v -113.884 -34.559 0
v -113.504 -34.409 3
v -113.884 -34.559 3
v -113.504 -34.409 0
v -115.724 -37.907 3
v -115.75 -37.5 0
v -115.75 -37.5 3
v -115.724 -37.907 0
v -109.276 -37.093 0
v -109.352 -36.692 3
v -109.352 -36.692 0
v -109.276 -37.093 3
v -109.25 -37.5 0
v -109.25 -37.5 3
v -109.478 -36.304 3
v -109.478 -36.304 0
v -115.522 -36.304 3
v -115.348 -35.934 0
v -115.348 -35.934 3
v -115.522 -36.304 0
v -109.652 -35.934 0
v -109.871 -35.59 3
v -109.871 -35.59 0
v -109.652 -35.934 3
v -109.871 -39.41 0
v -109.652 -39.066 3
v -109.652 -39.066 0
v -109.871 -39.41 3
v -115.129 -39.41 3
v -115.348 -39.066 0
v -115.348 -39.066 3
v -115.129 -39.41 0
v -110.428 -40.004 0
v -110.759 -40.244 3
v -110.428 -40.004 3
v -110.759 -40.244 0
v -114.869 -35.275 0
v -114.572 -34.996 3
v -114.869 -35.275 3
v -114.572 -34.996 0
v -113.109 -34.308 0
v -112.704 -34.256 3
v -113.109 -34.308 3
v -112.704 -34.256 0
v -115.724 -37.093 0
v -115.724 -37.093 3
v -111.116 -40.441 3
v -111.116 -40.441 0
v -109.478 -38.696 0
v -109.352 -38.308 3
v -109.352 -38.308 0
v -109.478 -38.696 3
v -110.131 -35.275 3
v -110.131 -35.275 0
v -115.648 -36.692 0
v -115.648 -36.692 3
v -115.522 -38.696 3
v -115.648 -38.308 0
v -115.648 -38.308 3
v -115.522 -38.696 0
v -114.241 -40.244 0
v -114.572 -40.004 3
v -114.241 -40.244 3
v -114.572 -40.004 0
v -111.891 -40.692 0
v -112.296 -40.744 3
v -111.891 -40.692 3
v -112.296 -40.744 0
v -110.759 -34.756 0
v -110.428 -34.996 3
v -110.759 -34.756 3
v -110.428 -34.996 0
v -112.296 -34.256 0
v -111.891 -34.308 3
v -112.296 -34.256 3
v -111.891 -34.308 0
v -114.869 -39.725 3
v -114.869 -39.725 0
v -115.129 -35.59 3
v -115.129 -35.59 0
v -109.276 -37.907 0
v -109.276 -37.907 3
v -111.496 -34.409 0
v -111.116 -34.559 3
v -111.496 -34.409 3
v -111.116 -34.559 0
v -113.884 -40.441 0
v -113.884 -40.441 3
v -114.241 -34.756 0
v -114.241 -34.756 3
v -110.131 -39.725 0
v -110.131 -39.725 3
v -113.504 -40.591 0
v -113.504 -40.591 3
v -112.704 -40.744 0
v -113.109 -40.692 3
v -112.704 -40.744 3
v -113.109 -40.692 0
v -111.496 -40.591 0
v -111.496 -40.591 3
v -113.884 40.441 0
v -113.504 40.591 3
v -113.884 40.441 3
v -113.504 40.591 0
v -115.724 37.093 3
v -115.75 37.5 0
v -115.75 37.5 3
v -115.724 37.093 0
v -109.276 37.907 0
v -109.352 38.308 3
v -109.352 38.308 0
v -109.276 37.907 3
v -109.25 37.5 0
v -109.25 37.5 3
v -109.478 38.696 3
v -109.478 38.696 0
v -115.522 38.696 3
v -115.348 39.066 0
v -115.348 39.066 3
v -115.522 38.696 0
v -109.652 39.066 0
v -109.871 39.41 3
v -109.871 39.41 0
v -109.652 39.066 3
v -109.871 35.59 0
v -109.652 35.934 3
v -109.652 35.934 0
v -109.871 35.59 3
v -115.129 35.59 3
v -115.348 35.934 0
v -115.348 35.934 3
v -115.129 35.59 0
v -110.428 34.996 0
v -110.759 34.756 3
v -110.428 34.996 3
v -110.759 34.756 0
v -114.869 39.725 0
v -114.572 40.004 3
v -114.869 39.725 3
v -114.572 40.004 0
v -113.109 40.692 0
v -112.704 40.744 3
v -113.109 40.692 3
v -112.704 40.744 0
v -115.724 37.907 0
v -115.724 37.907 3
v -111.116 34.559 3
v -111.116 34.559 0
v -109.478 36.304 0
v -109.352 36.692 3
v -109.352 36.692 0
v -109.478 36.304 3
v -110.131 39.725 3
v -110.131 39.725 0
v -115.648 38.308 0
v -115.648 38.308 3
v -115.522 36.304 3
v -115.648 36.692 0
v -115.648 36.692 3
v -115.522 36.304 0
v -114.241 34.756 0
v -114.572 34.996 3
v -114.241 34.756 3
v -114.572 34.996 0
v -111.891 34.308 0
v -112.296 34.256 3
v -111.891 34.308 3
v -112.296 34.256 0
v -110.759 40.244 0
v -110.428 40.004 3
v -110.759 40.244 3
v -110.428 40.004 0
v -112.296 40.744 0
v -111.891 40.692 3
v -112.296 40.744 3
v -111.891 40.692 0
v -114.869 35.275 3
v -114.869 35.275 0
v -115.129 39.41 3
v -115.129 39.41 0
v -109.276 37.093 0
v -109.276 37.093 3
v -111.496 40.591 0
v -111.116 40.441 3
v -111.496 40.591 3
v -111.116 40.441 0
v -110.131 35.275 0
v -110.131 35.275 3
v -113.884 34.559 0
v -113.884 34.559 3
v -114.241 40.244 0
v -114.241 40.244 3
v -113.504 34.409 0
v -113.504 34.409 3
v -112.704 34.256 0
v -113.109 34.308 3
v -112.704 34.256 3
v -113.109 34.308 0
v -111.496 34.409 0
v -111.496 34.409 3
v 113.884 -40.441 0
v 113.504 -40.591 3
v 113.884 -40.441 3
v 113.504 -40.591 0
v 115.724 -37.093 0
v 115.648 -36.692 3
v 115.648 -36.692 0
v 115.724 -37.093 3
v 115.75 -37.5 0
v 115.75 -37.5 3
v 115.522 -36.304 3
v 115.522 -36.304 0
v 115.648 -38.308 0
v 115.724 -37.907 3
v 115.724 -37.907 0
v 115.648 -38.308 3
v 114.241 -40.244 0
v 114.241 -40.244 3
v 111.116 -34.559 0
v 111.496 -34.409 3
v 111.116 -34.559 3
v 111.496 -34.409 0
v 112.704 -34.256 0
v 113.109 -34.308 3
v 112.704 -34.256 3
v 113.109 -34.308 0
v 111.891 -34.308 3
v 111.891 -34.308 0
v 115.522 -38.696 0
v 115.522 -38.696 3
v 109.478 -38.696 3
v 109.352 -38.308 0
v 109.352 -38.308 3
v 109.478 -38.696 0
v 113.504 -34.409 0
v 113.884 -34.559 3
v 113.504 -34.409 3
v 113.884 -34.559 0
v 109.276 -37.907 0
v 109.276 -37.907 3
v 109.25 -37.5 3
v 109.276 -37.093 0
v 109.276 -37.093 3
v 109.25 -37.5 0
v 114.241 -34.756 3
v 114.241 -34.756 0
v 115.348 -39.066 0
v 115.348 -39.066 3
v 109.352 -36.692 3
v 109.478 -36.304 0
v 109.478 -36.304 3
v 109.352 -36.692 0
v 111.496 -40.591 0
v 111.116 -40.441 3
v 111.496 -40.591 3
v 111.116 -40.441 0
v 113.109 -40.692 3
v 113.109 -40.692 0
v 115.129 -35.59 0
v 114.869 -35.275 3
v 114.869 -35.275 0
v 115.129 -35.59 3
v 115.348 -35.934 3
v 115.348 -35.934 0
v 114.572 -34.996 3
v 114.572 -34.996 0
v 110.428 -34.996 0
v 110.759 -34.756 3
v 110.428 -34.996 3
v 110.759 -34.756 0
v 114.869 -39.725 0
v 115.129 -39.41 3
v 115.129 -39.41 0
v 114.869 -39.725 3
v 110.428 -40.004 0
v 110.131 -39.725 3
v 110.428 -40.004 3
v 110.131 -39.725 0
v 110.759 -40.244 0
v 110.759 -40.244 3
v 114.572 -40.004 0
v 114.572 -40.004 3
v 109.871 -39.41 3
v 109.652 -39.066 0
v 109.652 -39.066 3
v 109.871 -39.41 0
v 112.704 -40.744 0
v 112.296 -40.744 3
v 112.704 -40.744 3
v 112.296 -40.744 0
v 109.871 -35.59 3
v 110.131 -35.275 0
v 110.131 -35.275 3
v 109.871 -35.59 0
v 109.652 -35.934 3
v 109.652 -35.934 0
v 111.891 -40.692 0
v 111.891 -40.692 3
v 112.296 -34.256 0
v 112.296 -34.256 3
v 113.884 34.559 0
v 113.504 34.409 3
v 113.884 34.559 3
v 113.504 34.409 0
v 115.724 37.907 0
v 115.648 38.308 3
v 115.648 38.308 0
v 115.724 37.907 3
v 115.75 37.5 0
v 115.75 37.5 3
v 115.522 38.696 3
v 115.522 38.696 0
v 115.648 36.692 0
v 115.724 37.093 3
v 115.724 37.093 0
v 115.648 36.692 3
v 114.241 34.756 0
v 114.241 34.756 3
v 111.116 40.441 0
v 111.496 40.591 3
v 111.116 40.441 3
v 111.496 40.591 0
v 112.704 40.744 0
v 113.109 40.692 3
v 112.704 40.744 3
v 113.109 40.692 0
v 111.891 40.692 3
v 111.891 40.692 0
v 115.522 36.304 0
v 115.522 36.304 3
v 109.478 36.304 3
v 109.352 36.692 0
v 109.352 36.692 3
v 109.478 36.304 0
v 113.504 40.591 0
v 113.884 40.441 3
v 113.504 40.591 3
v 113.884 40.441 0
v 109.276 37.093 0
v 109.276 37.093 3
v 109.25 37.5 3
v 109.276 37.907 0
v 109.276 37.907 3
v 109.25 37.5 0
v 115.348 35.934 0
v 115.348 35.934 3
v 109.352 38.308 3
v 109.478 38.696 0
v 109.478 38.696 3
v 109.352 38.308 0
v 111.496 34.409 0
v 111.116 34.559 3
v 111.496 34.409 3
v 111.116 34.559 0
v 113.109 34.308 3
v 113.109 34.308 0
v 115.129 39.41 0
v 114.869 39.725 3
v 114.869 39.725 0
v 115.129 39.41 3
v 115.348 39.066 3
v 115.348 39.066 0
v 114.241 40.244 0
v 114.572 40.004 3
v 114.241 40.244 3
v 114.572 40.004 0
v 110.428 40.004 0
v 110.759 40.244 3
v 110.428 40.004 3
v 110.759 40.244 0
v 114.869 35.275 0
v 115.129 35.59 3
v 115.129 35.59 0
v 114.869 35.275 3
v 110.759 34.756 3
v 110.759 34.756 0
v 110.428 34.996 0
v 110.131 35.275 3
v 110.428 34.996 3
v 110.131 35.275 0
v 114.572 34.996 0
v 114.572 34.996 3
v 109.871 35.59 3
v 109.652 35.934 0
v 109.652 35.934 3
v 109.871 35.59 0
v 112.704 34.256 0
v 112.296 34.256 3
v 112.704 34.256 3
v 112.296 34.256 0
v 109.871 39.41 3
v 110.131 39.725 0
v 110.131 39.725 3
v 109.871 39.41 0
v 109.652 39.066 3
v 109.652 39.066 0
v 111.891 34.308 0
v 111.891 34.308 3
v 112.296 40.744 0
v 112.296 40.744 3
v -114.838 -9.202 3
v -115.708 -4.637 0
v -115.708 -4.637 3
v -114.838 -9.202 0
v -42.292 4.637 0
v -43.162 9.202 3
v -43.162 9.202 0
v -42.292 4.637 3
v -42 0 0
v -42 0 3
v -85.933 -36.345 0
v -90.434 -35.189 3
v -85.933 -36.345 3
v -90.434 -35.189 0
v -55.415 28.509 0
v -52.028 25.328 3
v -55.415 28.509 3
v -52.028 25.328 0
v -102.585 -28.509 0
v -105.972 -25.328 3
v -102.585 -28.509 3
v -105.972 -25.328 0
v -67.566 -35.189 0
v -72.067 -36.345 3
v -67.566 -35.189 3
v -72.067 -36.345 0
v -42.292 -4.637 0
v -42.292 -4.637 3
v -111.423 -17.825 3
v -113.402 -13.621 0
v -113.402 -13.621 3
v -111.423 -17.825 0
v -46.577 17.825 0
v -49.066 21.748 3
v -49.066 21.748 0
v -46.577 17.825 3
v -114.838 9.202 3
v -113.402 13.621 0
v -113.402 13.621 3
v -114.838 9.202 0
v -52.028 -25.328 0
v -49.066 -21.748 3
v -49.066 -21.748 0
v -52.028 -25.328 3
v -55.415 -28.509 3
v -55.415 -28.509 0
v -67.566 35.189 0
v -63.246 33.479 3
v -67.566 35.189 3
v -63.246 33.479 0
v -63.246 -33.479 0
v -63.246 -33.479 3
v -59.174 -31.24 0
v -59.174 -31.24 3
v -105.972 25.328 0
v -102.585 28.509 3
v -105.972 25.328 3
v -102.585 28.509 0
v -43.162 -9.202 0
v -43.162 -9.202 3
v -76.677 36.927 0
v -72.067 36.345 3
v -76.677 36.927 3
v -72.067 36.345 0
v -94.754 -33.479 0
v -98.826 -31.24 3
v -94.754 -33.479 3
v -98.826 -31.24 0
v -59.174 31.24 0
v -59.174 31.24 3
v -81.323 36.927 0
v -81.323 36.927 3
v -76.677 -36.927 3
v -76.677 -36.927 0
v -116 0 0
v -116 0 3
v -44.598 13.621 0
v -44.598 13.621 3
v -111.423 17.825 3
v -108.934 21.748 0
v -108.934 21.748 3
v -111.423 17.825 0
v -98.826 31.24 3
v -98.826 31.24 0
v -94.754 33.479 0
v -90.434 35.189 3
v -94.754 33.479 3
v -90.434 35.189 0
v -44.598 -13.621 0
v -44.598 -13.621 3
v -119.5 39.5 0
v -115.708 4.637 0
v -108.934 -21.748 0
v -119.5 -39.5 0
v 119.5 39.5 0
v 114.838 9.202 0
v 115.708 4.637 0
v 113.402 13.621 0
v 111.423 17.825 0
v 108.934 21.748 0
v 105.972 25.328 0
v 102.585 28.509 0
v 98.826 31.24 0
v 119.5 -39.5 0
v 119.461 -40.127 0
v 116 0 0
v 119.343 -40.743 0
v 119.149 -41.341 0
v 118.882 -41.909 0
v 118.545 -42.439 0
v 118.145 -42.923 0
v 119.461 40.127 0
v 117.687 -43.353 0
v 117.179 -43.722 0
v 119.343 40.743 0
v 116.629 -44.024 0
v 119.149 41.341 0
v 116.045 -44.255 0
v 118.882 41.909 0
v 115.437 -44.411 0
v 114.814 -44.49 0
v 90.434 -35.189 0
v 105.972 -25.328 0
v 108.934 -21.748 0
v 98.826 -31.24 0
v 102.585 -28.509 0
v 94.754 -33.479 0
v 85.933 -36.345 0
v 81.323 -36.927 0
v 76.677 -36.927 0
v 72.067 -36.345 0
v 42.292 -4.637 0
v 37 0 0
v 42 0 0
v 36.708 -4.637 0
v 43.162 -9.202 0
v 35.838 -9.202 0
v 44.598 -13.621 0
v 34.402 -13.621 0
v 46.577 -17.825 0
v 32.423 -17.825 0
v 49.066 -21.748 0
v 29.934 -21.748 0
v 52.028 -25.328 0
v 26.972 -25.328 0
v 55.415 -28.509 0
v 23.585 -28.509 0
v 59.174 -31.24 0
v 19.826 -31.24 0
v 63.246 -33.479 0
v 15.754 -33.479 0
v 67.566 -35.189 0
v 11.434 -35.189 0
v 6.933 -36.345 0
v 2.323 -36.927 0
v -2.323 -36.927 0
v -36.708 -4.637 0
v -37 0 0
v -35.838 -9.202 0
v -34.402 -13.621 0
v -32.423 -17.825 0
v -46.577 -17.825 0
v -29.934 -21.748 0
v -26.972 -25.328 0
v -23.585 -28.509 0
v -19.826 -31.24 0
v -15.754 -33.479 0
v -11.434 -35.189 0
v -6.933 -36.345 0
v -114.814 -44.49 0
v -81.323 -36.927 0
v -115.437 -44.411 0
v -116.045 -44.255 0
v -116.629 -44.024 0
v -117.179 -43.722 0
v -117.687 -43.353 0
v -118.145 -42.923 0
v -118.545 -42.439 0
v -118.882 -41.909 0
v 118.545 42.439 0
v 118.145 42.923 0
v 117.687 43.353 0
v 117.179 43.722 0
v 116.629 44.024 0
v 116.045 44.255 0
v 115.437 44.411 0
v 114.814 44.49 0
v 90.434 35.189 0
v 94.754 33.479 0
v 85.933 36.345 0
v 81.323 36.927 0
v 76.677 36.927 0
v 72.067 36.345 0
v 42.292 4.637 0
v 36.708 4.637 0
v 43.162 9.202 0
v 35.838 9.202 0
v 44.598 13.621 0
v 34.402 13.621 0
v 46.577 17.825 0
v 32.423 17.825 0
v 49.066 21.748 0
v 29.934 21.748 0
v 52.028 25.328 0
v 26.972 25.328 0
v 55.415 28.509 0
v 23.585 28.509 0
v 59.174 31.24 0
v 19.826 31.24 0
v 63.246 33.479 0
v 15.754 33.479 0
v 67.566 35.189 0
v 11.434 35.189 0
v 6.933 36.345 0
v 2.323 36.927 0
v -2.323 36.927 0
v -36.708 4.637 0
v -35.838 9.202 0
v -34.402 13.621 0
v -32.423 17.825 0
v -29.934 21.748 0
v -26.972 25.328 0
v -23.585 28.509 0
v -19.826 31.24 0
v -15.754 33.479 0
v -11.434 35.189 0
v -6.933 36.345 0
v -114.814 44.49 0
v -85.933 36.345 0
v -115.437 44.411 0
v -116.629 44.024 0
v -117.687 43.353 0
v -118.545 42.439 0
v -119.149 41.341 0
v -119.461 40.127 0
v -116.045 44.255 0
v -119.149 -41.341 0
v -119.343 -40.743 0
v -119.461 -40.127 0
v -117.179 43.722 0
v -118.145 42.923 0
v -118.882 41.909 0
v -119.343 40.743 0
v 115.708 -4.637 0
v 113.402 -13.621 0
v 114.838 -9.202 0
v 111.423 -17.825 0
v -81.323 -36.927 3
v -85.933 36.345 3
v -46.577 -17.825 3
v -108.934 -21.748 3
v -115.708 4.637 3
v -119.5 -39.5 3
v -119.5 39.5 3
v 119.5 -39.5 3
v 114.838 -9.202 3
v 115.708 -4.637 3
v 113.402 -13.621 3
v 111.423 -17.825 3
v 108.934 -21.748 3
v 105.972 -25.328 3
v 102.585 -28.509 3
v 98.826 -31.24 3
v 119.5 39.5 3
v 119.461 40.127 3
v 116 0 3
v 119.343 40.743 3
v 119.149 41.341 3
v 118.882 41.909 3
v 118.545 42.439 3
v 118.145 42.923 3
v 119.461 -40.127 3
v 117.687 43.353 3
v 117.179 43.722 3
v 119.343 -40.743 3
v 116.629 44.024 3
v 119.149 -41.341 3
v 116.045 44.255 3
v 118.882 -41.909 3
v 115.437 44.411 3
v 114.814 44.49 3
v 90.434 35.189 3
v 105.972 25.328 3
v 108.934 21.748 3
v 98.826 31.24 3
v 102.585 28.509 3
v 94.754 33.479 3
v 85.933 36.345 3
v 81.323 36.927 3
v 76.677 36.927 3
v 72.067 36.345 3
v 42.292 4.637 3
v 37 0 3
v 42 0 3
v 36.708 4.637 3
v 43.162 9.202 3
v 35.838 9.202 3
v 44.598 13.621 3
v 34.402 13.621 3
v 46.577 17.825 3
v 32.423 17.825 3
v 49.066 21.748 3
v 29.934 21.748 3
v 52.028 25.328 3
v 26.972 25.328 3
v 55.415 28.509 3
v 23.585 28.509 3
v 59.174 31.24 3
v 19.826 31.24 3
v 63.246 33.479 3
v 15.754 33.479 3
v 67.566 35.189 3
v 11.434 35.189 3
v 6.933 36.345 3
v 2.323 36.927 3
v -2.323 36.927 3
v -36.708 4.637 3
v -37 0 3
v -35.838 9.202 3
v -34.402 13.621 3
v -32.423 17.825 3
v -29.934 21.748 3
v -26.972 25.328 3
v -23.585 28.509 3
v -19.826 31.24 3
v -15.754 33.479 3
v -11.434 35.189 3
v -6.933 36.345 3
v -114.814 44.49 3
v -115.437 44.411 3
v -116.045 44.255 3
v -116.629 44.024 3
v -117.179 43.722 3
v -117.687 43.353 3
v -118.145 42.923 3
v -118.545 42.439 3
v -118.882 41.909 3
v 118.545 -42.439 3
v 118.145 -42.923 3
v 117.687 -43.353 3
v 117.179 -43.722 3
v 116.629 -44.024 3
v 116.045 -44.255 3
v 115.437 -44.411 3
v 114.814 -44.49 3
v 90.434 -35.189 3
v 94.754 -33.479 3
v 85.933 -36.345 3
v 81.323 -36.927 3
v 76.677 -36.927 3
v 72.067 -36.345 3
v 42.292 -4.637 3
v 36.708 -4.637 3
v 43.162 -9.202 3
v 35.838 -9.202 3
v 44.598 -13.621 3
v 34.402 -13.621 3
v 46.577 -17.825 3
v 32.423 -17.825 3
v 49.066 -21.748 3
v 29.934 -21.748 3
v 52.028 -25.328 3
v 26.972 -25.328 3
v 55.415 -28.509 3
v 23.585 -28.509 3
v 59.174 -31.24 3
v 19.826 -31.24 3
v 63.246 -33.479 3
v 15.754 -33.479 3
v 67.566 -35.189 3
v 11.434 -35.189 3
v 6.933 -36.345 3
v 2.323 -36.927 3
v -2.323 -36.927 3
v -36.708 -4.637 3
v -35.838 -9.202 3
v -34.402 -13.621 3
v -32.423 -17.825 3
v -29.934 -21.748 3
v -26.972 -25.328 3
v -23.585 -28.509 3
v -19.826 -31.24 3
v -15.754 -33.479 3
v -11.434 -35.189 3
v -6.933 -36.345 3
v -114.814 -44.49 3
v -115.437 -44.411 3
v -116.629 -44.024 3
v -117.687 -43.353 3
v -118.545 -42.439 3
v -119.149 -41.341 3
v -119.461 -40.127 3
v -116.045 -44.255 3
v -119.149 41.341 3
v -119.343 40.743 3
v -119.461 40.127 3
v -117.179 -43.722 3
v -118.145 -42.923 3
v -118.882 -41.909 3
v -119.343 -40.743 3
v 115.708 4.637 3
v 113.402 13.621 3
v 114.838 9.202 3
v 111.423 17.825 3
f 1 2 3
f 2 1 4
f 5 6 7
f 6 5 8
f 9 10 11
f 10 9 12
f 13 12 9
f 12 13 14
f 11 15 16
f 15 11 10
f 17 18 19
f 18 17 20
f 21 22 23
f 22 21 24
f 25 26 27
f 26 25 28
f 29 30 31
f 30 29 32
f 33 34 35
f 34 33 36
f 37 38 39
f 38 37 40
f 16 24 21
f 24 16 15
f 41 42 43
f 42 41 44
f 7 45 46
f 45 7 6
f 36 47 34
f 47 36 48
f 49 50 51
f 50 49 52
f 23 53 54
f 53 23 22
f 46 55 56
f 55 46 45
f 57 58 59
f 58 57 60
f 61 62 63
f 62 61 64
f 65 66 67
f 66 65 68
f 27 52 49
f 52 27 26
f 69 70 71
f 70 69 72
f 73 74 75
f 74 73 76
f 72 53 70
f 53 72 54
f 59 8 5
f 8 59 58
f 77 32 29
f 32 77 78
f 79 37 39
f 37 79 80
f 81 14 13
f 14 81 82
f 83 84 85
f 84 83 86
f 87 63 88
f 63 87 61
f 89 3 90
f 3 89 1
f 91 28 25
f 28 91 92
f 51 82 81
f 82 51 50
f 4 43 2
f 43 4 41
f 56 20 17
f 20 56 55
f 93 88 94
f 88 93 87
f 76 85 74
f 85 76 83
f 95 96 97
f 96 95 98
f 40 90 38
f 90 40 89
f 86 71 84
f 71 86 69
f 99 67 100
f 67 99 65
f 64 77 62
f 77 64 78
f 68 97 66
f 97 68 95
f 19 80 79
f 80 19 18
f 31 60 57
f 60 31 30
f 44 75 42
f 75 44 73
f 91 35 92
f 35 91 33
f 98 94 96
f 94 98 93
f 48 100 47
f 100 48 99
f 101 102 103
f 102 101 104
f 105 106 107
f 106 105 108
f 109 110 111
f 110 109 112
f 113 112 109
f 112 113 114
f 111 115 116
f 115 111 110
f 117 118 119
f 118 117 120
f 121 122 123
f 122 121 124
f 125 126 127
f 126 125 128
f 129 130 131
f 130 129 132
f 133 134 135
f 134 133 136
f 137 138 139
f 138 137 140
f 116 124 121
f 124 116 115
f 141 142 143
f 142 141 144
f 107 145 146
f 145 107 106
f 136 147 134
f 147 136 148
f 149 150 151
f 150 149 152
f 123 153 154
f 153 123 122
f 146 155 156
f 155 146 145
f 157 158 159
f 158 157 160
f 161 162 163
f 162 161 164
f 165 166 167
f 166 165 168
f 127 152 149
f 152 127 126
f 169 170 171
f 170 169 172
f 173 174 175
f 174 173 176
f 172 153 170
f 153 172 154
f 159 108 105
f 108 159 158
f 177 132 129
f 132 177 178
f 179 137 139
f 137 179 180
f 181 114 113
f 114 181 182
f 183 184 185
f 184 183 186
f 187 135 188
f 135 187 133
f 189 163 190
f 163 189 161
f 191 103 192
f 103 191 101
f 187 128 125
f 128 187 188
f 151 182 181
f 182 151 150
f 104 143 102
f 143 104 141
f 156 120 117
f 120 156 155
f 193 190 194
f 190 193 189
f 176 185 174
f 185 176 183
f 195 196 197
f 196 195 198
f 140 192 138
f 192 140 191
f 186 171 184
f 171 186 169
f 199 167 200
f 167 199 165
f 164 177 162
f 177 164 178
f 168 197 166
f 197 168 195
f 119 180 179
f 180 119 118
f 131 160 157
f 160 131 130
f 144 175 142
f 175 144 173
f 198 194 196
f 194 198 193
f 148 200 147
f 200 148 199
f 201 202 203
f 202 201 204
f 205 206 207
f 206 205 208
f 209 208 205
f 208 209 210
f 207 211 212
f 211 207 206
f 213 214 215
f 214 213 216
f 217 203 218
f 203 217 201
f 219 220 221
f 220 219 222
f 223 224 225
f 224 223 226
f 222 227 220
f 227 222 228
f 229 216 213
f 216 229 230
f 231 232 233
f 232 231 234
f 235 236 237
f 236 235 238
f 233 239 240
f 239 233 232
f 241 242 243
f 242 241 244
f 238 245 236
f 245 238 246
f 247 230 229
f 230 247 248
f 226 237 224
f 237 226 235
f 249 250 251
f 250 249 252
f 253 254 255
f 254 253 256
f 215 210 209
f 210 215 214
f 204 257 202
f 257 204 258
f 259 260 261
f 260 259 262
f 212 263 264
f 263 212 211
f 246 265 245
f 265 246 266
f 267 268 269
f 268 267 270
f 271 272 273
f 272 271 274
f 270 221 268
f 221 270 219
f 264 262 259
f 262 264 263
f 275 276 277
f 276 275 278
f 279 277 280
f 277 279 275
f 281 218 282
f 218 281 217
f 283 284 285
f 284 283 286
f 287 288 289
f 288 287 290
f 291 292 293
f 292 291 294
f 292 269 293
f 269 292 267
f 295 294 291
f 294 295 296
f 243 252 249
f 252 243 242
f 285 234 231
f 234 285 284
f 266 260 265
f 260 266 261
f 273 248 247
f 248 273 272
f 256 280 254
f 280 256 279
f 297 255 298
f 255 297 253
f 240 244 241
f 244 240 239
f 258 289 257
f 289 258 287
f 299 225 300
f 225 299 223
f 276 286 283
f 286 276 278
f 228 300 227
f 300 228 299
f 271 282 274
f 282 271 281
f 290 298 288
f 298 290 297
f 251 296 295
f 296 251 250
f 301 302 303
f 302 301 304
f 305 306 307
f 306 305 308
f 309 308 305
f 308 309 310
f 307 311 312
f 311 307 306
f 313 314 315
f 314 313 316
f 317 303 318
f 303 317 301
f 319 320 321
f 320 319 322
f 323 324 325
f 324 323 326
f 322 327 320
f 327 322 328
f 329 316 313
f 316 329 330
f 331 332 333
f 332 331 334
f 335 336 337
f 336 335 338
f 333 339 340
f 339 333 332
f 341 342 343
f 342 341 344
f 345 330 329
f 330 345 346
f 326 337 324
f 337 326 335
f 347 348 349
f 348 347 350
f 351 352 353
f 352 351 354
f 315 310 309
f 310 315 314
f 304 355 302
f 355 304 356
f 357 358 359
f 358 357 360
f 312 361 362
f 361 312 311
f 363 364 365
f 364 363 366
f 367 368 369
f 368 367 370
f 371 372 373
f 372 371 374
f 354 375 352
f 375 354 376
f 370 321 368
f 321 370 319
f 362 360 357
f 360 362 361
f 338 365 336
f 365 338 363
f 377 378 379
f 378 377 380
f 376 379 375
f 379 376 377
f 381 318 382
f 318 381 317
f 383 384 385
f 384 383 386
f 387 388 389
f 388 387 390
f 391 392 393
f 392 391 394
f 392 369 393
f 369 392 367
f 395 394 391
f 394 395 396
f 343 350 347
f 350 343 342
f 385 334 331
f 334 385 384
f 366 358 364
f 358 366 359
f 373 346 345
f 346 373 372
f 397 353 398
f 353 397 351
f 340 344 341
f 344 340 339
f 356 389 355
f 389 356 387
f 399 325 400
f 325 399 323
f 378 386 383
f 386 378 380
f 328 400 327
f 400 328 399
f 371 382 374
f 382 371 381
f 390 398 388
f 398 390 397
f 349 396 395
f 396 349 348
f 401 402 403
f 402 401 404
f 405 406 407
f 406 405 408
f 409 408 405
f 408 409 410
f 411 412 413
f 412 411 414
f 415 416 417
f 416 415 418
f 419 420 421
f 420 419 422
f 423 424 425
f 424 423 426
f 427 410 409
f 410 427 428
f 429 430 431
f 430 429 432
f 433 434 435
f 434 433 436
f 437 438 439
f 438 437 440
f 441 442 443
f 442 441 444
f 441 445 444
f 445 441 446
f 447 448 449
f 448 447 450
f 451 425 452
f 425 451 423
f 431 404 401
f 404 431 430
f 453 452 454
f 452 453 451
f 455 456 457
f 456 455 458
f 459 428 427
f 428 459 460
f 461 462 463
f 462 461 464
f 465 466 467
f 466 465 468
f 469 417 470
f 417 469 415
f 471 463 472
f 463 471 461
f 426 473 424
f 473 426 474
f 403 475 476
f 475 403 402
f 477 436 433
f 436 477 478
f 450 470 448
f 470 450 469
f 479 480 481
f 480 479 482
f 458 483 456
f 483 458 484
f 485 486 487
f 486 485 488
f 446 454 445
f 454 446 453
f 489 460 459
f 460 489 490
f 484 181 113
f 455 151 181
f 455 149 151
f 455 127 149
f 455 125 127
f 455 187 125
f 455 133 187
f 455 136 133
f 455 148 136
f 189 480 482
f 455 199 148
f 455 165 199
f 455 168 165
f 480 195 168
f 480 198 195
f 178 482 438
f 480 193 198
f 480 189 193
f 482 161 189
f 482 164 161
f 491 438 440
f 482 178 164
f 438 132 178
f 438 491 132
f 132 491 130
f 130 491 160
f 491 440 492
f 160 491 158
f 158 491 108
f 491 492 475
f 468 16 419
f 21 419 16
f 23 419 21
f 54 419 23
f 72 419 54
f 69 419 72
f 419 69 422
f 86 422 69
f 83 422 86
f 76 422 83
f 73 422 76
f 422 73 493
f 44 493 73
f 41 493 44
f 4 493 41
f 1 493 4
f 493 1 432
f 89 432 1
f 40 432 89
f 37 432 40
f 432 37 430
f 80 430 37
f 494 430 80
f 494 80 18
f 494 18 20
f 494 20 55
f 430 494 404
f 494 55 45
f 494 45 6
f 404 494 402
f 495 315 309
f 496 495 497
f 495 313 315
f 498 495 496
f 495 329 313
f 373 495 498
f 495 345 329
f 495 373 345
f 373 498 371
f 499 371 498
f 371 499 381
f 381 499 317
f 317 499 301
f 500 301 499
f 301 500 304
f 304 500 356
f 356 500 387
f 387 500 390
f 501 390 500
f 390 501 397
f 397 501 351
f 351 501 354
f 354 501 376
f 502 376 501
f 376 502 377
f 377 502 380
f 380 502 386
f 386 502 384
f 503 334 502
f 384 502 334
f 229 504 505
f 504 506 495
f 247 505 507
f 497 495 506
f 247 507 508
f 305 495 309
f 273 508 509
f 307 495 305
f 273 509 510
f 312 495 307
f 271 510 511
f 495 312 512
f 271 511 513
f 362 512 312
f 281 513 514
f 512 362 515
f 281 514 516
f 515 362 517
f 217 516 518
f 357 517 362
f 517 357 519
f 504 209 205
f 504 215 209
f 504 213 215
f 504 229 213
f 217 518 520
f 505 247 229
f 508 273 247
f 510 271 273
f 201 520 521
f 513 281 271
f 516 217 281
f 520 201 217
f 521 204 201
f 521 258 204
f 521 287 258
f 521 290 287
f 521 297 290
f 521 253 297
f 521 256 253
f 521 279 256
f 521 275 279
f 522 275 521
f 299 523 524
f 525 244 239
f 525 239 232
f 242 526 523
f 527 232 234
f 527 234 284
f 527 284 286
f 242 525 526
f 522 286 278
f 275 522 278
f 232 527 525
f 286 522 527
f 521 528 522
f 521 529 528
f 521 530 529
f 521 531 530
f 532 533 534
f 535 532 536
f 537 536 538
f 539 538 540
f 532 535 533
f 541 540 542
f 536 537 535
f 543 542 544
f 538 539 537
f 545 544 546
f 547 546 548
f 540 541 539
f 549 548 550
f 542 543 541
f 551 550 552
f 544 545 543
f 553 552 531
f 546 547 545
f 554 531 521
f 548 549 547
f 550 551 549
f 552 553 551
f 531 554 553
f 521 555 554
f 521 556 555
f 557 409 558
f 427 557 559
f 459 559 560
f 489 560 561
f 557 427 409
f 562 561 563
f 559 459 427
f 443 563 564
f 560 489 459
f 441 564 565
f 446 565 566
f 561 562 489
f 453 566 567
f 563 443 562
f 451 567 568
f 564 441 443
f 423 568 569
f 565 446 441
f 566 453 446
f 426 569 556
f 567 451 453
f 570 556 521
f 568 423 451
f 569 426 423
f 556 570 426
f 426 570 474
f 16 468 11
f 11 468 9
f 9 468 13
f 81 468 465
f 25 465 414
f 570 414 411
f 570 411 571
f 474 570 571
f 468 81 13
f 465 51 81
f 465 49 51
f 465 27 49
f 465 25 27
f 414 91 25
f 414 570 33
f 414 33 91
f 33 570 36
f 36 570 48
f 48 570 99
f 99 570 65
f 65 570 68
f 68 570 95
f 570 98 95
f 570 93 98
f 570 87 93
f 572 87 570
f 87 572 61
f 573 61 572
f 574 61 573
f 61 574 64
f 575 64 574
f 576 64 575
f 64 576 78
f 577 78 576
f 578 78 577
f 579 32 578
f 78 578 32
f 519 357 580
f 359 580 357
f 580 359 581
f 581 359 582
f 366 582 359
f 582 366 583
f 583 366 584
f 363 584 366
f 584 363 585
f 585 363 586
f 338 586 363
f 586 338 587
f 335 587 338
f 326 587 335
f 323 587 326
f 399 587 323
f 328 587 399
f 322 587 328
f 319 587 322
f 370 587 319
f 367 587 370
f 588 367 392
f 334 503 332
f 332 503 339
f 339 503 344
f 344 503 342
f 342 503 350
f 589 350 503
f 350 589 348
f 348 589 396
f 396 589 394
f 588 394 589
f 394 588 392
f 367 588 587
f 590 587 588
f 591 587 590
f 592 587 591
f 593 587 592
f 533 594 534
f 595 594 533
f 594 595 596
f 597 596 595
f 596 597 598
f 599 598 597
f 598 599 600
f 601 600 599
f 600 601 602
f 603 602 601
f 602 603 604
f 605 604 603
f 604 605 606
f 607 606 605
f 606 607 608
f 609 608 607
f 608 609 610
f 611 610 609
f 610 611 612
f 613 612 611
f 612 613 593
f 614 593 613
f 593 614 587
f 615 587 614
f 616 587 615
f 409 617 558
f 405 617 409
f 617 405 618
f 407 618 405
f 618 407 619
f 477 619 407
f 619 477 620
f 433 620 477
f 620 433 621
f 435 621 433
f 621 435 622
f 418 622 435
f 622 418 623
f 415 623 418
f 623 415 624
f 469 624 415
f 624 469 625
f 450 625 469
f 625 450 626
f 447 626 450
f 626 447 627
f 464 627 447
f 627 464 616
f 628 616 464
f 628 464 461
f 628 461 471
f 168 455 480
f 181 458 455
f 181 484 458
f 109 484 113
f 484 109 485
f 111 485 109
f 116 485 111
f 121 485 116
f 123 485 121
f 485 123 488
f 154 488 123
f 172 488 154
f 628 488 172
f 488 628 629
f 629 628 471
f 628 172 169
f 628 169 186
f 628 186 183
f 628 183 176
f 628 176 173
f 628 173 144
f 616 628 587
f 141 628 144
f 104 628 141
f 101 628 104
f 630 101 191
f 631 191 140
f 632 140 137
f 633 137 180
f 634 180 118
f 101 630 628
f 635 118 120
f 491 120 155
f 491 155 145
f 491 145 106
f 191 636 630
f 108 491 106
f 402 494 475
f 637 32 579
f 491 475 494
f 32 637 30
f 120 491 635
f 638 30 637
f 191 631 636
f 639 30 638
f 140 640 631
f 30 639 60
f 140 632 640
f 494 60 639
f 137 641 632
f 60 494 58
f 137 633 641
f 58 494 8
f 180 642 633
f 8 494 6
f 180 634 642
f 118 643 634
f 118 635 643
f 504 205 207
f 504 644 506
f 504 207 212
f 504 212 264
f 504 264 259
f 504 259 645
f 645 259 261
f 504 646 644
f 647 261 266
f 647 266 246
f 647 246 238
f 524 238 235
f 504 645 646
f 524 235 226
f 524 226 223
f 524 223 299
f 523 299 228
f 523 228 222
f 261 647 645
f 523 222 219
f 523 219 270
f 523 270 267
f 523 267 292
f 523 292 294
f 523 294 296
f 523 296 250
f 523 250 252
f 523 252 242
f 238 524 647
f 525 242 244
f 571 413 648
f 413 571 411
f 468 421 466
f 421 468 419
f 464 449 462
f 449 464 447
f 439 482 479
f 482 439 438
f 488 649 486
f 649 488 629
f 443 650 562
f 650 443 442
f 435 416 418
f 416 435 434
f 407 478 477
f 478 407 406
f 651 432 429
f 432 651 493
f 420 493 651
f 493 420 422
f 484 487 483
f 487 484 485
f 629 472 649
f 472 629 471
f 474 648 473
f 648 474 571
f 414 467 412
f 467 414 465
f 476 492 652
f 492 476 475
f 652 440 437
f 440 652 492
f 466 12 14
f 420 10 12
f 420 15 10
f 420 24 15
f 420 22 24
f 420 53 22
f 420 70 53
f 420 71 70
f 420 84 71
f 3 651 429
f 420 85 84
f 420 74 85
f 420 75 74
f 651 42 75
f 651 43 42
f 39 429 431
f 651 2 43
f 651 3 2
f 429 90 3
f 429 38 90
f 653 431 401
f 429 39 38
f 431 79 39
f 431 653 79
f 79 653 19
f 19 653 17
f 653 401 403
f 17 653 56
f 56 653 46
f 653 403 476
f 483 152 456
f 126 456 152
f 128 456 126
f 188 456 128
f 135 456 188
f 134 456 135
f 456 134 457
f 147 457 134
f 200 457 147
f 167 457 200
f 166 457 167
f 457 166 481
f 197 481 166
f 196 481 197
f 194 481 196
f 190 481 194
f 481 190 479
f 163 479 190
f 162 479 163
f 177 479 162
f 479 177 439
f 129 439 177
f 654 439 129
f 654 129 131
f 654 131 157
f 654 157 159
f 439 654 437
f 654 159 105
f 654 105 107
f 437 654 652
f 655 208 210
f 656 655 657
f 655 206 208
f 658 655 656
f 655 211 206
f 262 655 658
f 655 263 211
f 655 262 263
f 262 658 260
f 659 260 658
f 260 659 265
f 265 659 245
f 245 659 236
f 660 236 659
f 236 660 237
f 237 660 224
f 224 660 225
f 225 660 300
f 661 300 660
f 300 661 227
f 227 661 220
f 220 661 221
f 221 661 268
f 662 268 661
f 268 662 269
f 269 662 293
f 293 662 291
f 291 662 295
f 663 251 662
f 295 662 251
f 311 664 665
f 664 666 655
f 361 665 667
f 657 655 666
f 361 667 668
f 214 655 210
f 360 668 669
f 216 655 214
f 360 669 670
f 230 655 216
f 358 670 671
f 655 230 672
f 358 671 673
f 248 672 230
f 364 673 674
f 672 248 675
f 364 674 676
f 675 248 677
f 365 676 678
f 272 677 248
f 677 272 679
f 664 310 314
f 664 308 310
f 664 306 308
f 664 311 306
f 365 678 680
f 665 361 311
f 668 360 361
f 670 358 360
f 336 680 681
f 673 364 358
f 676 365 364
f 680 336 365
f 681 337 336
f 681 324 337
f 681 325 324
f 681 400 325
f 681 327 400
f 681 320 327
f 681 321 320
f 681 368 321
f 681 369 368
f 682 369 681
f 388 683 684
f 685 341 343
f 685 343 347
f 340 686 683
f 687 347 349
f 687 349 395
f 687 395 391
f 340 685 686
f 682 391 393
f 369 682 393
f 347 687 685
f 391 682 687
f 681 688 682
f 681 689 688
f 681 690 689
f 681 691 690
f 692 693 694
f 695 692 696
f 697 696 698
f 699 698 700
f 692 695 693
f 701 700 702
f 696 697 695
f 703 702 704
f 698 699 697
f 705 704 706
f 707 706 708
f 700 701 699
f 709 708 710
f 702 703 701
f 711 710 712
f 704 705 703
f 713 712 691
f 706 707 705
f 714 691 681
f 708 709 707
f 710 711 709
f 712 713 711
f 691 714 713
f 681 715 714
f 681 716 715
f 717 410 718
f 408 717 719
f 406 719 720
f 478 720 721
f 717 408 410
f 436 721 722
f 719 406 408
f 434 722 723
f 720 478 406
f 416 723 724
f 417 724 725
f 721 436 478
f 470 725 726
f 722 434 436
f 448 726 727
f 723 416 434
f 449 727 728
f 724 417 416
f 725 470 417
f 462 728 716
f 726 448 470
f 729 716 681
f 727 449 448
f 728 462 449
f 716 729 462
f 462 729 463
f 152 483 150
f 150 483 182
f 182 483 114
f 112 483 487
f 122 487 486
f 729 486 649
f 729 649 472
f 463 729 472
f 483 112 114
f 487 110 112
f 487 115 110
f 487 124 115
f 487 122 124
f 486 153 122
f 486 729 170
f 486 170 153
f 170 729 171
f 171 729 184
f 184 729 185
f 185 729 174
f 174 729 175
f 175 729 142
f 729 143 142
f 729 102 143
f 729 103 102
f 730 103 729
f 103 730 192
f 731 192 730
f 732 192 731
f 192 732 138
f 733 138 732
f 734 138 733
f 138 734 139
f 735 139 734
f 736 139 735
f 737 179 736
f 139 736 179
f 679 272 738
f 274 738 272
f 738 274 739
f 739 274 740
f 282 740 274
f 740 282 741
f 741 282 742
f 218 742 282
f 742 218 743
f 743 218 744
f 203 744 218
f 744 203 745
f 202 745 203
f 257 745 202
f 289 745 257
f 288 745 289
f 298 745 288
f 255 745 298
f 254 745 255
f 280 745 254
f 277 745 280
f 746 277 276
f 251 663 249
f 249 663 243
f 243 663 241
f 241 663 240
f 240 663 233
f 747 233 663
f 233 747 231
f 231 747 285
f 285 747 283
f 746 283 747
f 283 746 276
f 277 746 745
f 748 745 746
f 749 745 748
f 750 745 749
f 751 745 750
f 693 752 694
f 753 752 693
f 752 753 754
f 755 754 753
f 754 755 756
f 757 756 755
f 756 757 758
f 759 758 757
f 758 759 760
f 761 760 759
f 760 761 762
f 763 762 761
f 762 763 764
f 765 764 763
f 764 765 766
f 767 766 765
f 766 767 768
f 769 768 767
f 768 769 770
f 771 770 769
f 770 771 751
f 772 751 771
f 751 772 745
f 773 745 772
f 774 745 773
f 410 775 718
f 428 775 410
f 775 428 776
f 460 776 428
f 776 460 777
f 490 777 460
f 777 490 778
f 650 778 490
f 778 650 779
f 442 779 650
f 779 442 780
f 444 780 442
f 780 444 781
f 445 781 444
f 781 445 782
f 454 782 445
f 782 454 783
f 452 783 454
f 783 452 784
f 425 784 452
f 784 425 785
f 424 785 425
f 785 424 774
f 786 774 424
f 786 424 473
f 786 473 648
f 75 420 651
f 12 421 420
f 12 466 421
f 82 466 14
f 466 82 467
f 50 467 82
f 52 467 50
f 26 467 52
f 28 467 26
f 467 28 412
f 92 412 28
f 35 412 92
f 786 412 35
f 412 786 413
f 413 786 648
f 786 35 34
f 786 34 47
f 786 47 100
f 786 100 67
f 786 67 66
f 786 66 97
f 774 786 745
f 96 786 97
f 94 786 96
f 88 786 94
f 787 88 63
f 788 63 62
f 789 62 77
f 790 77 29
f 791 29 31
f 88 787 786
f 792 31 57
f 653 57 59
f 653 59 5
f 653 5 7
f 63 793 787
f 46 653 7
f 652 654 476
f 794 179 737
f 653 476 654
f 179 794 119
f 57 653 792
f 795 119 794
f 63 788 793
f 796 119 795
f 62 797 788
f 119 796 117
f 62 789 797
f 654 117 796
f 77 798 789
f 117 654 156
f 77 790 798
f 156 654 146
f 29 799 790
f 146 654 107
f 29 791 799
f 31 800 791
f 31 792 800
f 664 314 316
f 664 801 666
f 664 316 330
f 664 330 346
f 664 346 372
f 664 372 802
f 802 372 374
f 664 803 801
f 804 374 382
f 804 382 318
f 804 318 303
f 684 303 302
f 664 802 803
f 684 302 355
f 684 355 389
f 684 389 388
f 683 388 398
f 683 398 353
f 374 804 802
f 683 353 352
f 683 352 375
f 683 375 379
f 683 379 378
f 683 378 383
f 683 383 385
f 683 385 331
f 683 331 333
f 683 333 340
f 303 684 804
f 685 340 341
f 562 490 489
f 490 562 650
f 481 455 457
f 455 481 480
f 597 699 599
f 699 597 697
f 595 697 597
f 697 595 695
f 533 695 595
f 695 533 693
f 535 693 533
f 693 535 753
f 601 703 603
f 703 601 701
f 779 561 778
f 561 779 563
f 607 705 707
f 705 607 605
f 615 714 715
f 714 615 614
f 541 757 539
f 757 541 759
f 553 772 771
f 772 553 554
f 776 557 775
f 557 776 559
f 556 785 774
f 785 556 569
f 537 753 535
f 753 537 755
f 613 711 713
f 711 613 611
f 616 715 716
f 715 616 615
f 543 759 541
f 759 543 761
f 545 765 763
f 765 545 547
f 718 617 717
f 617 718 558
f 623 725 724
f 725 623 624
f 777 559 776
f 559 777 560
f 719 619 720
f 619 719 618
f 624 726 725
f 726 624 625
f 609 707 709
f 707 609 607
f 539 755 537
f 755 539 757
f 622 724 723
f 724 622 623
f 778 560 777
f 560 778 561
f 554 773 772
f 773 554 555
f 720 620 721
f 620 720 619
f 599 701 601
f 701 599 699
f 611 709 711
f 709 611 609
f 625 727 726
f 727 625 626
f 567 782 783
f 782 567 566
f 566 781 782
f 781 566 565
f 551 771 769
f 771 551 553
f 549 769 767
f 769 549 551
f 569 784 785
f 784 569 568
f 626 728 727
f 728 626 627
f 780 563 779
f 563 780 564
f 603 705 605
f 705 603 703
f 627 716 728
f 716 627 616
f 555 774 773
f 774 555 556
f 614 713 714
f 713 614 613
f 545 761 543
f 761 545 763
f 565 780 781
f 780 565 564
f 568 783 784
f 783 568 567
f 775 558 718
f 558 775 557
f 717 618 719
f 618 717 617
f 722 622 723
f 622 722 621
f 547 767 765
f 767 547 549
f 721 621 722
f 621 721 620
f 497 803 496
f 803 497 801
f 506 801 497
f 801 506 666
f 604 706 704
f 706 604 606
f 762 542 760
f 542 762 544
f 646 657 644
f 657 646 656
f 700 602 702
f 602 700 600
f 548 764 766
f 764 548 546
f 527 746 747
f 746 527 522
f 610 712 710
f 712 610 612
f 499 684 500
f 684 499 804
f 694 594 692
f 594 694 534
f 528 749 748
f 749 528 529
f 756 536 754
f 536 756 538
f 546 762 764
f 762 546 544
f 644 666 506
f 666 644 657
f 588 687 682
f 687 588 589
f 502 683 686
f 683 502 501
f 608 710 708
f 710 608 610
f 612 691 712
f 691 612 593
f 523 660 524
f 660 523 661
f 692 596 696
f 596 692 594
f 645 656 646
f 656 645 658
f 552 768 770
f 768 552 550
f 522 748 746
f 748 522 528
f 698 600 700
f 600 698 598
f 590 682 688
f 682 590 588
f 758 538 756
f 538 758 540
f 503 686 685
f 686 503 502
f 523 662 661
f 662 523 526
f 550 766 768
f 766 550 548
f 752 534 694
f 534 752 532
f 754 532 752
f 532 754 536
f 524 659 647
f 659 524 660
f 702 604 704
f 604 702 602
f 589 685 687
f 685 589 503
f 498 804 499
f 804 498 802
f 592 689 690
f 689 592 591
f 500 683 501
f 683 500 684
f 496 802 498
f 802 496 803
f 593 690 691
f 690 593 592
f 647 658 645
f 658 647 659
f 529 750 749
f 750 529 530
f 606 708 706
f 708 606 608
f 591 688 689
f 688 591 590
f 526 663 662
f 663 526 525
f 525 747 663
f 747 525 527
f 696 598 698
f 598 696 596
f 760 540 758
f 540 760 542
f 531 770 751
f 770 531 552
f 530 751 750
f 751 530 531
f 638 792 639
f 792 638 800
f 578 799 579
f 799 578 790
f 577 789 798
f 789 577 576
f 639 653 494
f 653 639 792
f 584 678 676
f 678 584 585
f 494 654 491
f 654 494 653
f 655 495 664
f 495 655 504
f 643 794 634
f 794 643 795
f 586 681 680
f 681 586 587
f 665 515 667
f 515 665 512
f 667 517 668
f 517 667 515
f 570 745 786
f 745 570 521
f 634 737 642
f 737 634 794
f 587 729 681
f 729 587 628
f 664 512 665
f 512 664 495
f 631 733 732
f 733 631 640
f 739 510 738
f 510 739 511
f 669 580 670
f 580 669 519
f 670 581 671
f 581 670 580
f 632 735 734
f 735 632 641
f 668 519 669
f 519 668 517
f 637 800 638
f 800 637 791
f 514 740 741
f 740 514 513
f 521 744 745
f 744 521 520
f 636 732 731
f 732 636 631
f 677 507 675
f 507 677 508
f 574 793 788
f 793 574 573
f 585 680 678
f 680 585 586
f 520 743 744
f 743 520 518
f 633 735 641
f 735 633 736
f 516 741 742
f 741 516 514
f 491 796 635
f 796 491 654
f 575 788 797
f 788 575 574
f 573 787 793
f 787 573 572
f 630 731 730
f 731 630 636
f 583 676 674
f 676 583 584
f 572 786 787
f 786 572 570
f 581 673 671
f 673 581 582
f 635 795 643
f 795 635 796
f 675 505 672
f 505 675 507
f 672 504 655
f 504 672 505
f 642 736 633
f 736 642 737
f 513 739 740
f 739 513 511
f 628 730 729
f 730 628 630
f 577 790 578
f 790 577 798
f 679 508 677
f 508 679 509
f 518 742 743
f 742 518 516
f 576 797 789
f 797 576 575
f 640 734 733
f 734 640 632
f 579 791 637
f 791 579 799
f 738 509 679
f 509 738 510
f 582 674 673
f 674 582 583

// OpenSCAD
$fn = 50;

difference() {
	union() {
		hull() {
			translate(v = [-114.5, 39.5, 0]) {
				cylinder(h = 3, r = 5);
			}
			translate(v = [114.5, 39.5, 0]) {
				cylinder(h = 3, r = 5);
			}
			translate(v = [-114.5, -39.5, 0]) {
				cylinder(h = 3, r = 5);
			}
			translate(v = [114.5, -39.5, 0]) {
				cylinder(h = 3, r = 5);
			}
		}
	}
	union() {
		translate(v = [-112.5, -37.5, -100.0]) {
			cylinder(h = 200, r = 3.25);
		}
		translate(v = [-112.5, 37.5, -100.0]) {
			cylinder(h = 200, r = 3.25);
		}
		translate(v = [112.5, -37.5, -100.0]) {
			cylinder(h = 200, r = 3.25);
		}
		translate(v = [112.5, 37.5, -100.0]) {
			cylinder(h = 200, r = 3.25);
		}
		translate(v = [-112.5, -37.5, -100.0]) {
			cylinder(h = 200, r = 1.8);
		}
		translate(v = [-112.5, 37.5, -100.0]) {
			cylinder(h = 200, r = 1.8);
		}
		translate(v = [112.5, -37.5, -100.0]) {
			cylinder(h = 200, r = 1.8);
		}
		translate(v = [112.5, 37.5, -100.0]) {
			cylinder(h = 200, r = 1.8);
		}
		translate(v = [-79.0, 0, 0.0]) {
			cylinder(h = 3, r = 37.0);
		}
		cylinder(h = 3, r = 37.0);
		translate(v = [79.0, 0, 0.0]) {
			cylinder(h = 3, r = 37.0);
		}
	}
}
